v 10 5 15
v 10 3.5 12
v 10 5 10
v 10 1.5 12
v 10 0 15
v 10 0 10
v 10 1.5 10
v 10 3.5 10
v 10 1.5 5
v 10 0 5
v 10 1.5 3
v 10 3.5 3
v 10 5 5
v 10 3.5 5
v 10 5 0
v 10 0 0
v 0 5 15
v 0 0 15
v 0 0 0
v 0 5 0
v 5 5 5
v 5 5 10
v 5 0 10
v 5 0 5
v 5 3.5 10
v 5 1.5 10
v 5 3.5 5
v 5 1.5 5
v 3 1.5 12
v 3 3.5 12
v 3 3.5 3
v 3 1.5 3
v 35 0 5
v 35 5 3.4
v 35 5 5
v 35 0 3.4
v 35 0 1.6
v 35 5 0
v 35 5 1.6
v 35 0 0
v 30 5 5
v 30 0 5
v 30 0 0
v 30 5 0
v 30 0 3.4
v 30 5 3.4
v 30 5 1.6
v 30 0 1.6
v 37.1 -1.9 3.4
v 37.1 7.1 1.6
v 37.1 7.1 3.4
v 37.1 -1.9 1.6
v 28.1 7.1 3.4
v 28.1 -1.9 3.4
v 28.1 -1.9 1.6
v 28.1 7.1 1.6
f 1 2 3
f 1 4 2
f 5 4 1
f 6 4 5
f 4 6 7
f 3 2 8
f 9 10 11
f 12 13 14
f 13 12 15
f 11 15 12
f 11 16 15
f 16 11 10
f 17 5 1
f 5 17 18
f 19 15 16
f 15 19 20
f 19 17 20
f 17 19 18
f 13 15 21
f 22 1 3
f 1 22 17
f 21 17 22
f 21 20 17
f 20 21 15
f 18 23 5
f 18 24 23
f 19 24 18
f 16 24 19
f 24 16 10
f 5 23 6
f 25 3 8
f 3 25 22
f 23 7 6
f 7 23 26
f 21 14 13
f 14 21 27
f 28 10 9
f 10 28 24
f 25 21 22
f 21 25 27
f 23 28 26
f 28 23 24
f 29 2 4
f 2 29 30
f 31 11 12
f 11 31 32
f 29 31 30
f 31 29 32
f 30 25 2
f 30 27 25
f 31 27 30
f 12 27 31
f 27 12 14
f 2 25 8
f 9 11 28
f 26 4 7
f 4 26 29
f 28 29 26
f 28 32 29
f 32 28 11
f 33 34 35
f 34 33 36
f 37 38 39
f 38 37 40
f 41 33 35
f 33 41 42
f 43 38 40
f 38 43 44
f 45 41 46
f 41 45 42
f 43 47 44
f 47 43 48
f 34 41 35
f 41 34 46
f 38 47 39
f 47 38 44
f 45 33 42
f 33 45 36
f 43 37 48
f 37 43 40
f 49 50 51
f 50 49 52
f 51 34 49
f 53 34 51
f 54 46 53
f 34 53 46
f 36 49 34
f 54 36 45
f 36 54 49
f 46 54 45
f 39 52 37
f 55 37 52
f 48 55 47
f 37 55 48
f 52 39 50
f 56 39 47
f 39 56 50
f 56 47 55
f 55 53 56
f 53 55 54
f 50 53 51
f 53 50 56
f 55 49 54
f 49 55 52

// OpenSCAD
// file: vendors/UtilitySCAD-R1/utility.scad
/*This library, part of UtilitySCAD, is placed into the public domain by NMR_Scientist.

Version: R1
Title: UtilitySCAD
Description: Miscellaneous utility modules I developed over the course of several projects to reuse common operations that were seen over various models.

History:
* ??/??/2024 - R1 - First release to be with a model whenever it is released.
*/

$fa = 1;
$fs = 0.1;

use <MCAD/regular_shapes.scad>;

//Move objects in the x-axis.
module move_x (x)
{
    translate([x,0,0])
    {
        children();
    }
}

//Move objects in the y-axis
module move_y (y)
{
    translate([0,y,0])
    {
        children();
    }
}

//Move objects in the z-ax
module move_z (z)
{
    translate([0,0,z])
    {
        children();
    }
}

//Move objects by a given point in all direction. -1 would means moving to the left, moving back, and moving down by one point.
module move_by(point)
{
    translate([point,point,point])
    {
        children();
    }
}

//Exactly like move_by, but a negation. Named for its very common use in adding tolerance to objects.
module move_by_margin(m)
{
    move_by(-m)
    {
        children();
    }
}

//A cylinder rotated to its side.
module hor_cylinder(width,r,r)
{
    move_y(r)
        move_z(r)
            rotate([0,90,0])
            {
                cylinder(width,r,r);
            }
}

module hor_cylinder_y(length,r)
{
    translate([r * 2,0,0])
    {
        rotate([0,0,90])
        {
            hor_cylinder(length,r);
        }
    }
}


//Cut a object at a given height and then move that object down, usually to zero if the object was placed at zero height.
module hor_cut(width,length,height)
{
    translate([0,0,-height])
    {
        difference()
        {
            children();
            translate([-1,-1,-1])
            {
                cube([width + 2,length + 2,height + 1]);
            }
        }
    }
}

function bevel_radius(length) = length * 2 / 3;
function bevel_height(r) = r * sqrt(3)/2;

//Bevel at 45 degree slope up, facing back, then extrude upward by height.
module bevel_up_back_45(width,length,height)
{
    r = bevel_radius(length);
    z = bevel_height(r);
    m = 0.1;
    m_2 = m * 2;
    difference()
    {
        translate([0,r / 2,z])
        {
            rotate([0,90,0])
            {
                triangle_prism(width,r);
            }
        }
        // Cut off to the required height.
        move_x(-m)
            move_y(-m)
                move_z(height)
                   cube([width + m,length + m,z * 2 - height]);
    }
    //If cutting off isn't happening simply add height.
    if (height >= z)
    {
        move_z(z)
        {
            cube([width,length,height - z]);
        }
    }
}

module bevel_up_front_45(width,length,height)
{
    r = bevel_radius(length);
    z = bevel_height(r);
    m = 0.1;
    m_2 = m * 2;
    difference()
    {
        translate([width,r,z])
        {
            rotate([0,90,180])
            {
                triangle_prism(width,r);
            }
        }
        // Cut off to the required height.
        move_x(-m)
            move_y(-m)
                move_z(height)
                   cube([width + m,length + m,z * 2 - height]);
    }
    //If cutting off isn't happening simply add height.
    if (height >= z)
    {
        move_z(z)
        {
            cube([width,length,height - z]);
        }
    }
}

module center_z(centering_z,target_z)
{
    z = (target_z - centering_z) / 2;
    translate([0,0,z])
    {
        children();
    }
}

module center_y(centering_y,target_y)
{
    y = (target_y - centering_y) / 2;
    translate([0,y,0])
    {
        children();
    }
}

//Center an object against a particular width of another object.
module center(centering_w,target_w)
{
    x = (target_w - centering_w) / 2;
    translate([x,0,0])
    {
        children();
    }
}

//Move object to a certain value of x, but also account for the object size, such that the object is place before the point x. For a postive value of x, that is before the x, for a negative value of x, that is next to x. Useful for dimensional accurate placement.
module move_object_x(x,r)
{
    diameter = r * 2;
    if (abs(x) < diameter)
    {
        echo("Cannot move!");
    }
    else
    {
        if (x > 0)
        {
            move_x(x - diameter)
            {
                children();
            }
        }
        else if (x < 0)
        {
            move_x(x + diameter)
                children();
        }
    }
}


//Move object to a certain value of z, but also account for the object size, such that the object is place before the point z. For a postive value of z, that is below of z, for a negative value of z, that is above z. Useful for dimensional accurate placement.
module move_object_z(z, r)
{
    diameter = r * 2;
    if (abs(z) < diameter)
    {
        echo("Cannot move!");
    }
    else
    {
        if (z > 0)
        {
            move_z(z - diameter)
            {
                children();
            }
        }
        else if (z < 0)
        {
            move_z(z + diameter)
                children();
        }
    }
}


//Generaate all notches in a castellation at the same time, and space each notch for the length of the notch.
module notches(n, multipler)
{
    for (x = [1:n])
    {
        final_x = (x - 1) * multipler;
        move_x(final_x)
        {
            if ((x - 1) % 2 == 0)
            {
               children();
            }
        }
    }
}

//Get the total width of the Castellation, starting with the first and last notches.
function CastellateTotalW(w,size) = (w - 1) % 2 == 1 ? (w - 1) * size.x : w * size.x;


//Center the resulting castellation of a certain cuboid size.
module castellate(width,size, m = 0)
{
    total_notches = floor(width / size.x);
    total_w = CastellateTotalW(total_notches,size);
    center(total_w,width)
    {
        notches(total_notches,size.x)
        {
            move_x(m)
            {
                shrink = [size.x - (m * 2),size.y,size.z];
                cube(shrink);
            }
        }
    }

}
// main file
use <vendors/UtilitySCAD-R1/utility.scad>;

size = 5;
width = 10;
height = 15;
m_2 = 0.2;
m = 0.1;

difference()
{
    cube([width,size,height]);
    translate([size,-0.1,size])
    {
        cube([width,size + 0.2,height - (size * 2)]);
    }
    center_y(2,5)
    {
        translate([size - 2,0,size - 2])
        {
            cube([width,2,height - (size * 2) + 4]);
        }
    }
}

translate([30,0,0])
{
    cube([width - 5,height - (size * 2),size]);
    center_z(2 - m_2,5)
    {
        translate([-2 + m,-2 + m,0])
        {
            cube([width - 5 + 4,height - (size * 2) + 4,2 - m_2]);
        }
    }
}
